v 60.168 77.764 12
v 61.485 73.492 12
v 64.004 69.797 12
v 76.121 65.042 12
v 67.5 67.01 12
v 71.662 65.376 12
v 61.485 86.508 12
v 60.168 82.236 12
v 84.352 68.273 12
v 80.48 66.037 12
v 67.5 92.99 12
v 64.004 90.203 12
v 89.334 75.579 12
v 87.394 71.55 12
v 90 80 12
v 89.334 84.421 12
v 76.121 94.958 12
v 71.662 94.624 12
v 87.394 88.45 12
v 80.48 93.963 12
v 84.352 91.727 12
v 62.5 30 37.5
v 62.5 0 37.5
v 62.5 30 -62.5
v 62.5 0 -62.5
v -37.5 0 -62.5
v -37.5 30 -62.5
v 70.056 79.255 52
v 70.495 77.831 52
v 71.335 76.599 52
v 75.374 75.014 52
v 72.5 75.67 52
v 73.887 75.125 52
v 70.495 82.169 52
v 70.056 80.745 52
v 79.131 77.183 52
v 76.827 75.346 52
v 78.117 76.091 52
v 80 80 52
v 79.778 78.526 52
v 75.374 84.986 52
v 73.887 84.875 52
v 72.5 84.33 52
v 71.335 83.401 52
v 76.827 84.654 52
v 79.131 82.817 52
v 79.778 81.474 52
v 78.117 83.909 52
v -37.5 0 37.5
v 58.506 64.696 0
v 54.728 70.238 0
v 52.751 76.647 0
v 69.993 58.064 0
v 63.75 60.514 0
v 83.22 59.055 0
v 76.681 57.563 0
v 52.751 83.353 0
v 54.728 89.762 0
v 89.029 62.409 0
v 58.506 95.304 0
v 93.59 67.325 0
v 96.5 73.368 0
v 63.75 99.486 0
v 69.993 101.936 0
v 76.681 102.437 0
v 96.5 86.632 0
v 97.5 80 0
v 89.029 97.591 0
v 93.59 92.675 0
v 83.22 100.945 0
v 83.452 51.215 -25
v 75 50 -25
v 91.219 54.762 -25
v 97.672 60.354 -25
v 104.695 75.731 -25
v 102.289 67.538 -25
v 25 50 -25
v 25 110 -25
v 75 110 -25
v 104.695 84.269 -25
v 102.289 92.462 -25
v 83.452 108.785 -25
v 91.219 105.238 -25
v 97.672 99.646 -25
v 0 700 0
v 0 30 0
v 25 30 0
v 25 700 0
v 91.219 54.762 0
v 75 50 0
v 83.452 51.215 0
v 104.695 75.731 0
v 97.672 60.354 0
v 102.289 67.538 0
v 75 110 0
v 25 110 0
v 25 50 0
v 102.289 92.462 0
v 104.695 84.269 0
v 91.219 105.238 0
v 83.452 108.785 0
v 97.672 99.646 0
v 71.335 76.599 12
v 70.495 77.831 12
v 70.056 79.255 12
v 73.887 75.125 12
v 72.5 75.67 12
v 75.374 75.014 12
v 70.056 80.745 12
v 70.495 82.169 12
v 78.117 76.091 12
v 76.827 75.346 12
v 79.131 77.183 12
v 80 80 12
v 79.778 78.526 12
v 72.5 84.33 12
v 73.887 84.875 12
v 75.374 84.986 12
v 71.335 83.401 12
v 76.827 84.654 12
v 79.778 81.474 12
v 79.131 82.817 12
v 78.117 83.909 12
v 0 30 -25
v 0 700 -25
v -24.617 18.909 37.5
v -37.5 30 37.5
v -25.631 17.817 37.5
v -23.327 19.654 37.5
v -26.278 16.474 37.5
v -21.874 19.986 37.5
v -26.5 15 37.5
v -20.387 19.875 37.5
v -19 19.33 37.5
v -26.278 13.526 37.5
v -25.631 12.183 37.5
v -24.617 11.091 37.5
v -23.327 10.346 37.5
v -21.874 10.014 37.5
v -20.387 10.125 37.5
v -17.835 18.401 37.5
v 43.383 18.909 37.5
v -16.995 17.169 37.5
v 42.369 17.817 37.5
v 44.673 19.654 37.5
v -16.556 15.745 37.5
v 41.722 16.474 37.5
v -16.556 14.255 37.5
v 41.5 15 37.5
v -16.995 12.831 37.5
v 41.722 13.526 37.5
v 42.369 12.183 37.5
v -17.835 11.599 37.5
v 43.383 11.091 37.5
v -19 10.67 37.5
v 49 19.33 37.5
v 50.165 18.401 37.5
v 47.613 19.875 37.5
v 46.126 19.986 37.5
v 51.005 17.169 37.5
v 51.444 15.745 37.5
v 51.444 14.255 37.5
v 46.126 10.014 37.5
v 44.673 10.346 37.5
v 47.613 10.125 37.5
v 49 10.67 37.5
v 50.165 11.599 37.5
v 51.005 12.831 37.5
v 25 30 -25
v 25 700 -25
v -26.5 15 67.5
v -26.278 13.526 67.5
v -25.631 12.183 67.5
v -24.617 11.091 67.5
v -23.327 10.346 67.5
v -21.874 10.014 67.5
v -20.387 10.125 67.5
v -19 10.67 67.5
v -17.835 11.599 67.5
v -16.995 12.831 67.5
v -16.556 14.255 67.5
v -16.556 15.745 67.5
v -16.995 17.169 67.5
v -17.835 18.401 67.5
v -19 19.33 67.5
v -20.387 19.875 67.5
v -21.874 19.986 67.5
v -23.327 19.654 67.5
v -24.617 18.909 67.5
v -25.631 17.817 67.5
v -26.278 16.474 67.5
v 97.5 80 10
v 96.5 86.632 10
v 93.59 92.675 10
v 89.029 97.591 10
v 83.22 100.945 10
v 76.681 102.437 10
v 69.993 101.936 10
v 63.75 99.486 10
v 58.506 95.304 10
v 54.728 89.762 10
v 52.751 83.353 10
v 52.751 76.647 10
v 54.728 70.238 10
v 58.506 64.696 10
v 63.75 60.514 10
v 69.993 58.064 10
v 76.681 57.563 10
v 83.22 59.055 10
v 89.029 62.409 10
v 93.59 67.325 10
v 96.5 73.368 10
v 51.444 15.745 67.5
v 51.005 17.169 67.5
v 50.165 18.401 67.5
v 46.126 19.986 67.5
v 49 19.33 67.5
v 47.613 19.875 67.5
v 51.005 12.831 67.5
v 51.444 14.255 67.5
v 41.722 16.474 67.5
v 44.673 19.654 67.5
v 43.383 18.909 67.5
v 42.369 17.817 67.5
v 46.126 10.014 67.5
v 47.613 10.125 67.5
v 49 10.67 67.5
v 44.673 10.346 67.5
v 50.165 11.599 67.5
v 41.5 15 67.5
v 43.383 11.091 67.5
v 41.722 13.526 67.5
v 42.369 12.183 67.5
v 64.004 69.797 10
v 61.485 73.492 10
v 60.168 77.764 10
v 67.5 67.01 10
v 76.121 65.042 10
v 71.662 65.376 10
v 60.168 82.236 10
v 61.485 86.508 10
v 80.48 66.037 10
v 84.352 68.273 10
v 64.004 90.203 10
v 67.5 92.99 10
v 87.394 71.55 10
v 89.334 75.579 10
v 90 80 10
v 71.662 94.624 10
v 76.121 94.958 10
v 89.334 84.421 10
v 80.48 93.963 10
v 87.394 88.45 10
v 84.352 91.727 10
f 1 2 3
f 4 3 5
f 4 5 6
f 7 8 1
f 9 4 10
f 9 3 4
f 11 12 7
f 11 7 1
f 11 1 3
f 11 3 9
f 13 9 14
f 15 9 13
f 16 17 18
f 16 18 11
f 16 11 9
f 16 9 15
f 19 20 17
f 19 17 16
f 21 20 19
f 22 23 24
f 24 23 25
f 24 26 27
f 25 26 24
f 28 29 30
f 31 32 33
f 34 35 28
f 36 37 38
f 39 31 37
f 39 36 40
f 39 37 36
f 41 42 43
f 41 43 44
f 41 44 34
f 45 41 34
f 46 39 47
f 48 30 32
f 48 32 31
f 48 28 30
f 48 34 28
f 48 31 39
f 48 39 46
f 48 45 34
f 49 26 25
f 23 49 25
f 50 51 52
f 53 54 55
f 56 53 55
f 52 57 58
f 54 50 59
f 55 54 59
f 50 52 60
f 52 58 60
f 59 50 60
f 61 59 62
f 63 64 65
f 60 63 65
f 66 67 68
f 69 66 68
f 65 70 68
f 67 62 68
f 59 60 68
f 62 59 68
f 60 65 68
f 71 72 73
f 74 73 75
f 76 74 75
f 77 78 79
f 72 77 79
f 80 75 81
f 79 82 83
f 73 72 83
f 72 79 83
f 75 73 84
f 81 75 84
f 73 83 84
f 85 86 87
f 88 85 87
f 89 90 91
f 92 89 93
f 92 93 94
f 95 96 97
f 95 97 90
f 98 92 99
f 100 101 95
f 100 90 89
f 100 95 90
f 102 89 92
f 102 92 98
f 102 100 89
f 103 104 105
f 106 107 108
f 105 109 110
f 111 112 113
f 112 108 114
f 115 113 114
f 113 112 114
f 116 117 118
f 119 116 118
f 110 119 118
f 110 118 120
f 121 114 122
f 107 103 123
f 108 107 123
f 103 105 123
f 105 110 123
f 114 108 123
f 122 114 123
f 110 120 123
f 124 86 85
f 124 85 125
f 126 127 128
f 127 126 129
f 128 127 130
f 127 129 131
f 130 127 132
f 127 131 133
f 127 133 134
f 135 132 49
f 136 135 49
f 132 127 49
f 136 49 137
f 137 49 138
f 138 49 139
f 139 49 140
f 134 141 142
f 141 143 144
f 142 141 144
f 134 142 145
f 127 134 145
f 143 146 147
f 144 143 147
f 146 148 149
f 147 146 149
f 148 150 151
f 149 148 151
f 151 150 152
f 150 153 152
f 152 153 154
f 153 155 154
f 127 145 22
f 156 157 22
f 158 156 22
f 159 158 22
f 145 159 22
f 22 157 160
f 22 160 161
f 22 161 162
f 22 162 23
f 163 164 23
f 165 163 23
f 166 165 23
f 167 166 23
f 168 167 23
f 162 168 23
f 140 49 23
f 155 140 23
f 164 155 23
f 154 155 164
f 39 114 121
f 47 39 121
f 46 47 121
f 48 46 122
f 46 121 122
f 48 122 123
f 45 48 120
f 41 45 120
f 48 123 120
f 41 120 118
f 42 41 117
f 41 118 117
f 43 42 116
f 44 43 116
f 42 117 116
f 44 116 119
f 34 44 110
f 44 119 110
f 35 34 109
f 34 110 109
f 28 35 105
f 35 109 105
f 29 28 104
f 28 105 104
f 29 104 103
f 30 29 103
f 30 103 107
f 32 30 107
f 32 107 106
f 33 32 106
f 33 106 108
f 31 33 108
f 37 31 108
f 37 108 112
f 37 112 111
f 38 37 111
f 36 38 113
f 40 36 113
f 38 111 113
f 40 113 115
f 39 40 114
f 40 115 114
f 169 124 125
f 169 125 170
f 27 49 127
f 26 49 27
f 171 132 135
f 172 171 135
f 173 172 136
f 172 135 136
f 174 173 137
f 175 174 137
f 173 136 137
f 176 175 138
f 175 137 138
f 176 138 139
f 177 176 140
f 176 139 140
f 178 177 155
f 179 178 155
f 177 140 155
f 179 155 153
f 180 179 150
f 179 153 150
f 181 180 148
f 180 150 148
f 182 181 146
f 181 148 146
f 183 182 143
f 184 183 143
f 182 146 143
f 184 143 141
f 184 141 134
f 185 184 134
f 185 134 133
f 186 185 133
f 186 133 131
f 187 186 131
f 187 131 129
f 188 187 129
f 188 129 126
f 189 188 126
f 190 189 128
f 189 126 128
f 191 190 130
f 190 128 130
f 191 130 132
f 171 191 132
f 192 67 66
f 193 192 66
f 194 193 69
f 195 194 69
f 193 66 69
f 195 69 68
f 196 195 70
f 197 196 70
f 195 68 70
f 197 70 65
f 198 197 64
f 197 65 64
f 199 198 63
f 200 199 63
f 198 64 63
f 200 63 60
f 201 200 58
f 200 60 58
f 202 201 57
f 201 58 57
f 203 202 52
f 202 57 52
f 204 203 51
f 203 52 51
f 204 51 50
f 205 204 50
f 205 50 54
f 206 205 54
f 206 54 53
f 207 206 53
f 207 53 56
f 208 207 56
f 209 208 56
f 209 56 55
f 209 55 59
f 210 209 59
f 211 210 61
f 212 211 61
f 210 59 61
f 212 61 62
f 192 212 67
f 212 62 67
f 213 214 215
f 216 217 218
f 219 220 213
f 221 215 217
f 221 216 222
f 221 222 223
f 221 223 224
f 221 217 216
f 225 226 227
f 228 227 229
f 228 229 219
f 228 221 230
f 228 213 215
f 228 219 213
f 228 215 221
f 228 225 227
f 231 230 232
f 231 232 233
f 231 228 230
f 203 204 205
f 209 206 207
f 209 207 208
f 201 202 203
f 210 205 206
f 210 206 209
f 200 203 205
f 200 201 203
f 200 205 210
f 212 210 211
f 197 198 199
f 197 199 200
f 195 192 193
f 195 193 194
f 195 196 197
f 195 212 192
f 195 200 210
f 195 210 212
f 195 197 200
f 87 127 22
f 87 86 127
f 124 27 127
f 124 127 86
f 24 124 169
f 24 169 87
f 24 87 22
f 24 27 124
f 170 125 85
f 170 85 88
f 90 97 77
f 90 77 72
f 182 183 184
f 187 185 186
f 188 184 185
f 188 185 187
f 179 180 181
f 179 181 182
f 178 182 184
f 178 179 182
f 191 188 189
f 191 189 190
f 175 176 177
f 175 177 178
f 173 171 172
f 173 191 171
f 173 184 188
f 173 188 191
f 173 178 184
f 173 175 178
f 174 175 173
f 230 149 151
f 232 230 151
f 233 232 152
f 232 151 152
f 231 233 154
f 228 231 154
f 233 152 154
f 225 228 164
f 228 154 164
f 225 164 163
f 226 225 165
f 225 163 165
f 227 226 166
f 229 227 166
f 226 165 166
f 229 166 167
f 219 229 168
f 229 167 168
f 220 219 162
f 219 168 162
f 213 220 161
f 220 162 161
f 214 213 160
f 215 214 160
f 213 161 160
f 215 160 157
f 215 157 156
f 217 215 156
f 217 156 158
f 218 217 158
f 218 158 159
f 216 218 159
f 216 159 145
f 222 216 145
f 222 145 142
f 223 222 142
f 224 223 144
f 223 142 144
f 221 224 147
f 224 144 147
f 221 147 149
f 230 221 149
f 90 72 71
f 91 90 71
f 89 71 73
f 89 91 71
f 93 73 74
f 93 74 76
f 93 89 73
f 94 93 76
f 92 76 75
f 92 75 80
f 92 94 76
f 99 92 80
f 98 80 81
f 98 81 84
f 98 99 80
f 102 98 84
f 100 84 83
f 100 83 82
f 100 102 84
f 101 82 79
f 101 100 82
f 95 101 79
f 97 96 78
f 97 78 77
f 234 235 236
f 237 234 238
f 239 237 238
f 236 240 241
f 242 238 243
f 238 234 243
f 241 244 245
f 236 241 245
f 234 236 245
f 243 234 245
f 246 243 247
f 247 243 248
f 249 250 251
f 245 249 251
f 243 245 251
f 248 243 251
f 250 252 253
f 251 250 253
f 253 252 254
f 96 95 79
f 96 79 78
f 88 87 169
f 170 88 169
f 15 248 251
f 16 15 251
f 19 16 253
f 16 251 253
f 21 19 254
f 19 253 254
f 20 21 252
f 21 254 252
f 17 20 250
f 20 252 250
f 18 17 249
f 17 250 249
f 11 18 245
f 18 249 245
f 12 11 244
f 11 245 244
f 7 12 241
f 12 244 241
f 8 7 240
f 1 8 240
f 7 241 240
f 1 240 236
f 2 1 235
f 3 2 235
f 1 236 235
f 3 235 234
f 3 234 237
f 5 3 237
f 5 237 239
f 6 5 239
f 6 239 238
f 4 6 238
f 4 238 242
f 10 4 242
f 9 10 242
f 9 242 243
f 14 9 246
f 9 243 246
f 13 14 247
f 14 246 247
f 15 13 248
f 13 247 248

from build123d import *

# Parameters (mm, degrees)
SKETCH_1_W      = 25
SKETCH_1_H      = 25
EXTRUDE_1_DEPTH = 700
EXTRUDE_2_DEPTH = 25
SKETCH_3_R      = 22.5
EXTRUDE_3_DEPTH = 10
SKETCH_4_R      = 15
EXTRUDE_4_DEPTH = 2
SKETCH_6_R      = 5
EXTRUDE_5_DEPTH = 40
SKETCH_7_W      = 100
SKETCH_7_H      = 100
EXTRUDE_6_DEPTH = 30
SKETCH_9_R      = 5
EXTRUDE_7_DEPTH = 30


with BuildPart() as part:
    # 草图1 → 凸台-拉伸1 (new body)
    with BuildSketch(Plane(origin=(0, 0, 0), x_dir=(1, 0, 0), z_dir=(0, 1, 0))):
        with Locations((12.5, 12.5)):
            Rectangle(SKETCH_1_W, SKETCH_1_H)
    extrude(amount=EXTRUDE_1_DEPTH)

    # 草图7 → 凸台-拉伸6 (add)
    with BuildSketch(Plane(origin=(0, 0, 0), x_dir=(1, 0, 0), z_dir=(0, 1, 0))):
        with Locations((12.5, 12.5)):
            Rectangle(SKETCH_7_W, SKETCH_7_H)
    extrude(amount=EXTRUDE_6_DEPTH)

    # 草图9 → 凸台-拉伸7 (add)
    with BuildSketch(Plane.XY.offset(37.5)):
        with Locations(Location((-21.5, 15, 0), (0, 0, 180))):
            Circle(SKETCH_9_R)
        with Locations(Location((46.5, 15, 0), (0, 0, 180))):
            Circle(SKETCH_9_R)
    extrude(amount=EXTRUDE_7_DEPTH)


with BuildPart() as body_2:
    # 草图2 → 凸台-拉伸2 (new body)
    with BuildSketch(Plane.XY):
        with BuildLine():
            Line((75, 110), (25, 110))
            Line((25, 110), (25, 50))
            Line((25, 50), (75, 50))
            ThreePointArc((75, 50), (105, 80), (75, 110))
        make_face()
    extrude(amount=-EXTRUDE_2_DEPTH)


with BuildPart() as body_3:
    # 草图3 → 凸台-拉伸3 (new body)
    with BuildSketch(Plane.XY):
        with Locations((75, 80)):
            Circle(SKETCH_3_R)
    extrude(amount=EXTRUDE_3_DEPTH)


with BuildPart() as body_4:
    # 草图4 → 凸台-拉伸4 (new body)
    with BuildSketch(Plane.XY.offset(10)):
        with Locations((75, 80)):
            Circle(SKETCH_4_R)
    extrude(amount=EXTRUDE_4_DEPTH)


with BuildPart() as body_5:
    # 草图6 → 凸台-拉伸5 (new body)
    with BuildSketch(Plane.XY.offset(12)):
        with Locations((75, 80)):
            Circle(SKETCH_6_R)
    extrude(amount=EXTRUDE_5_DEPTH)


solid = Compound([part.part, body_2.part, body_3.part, body_4.part, body_5.part])
